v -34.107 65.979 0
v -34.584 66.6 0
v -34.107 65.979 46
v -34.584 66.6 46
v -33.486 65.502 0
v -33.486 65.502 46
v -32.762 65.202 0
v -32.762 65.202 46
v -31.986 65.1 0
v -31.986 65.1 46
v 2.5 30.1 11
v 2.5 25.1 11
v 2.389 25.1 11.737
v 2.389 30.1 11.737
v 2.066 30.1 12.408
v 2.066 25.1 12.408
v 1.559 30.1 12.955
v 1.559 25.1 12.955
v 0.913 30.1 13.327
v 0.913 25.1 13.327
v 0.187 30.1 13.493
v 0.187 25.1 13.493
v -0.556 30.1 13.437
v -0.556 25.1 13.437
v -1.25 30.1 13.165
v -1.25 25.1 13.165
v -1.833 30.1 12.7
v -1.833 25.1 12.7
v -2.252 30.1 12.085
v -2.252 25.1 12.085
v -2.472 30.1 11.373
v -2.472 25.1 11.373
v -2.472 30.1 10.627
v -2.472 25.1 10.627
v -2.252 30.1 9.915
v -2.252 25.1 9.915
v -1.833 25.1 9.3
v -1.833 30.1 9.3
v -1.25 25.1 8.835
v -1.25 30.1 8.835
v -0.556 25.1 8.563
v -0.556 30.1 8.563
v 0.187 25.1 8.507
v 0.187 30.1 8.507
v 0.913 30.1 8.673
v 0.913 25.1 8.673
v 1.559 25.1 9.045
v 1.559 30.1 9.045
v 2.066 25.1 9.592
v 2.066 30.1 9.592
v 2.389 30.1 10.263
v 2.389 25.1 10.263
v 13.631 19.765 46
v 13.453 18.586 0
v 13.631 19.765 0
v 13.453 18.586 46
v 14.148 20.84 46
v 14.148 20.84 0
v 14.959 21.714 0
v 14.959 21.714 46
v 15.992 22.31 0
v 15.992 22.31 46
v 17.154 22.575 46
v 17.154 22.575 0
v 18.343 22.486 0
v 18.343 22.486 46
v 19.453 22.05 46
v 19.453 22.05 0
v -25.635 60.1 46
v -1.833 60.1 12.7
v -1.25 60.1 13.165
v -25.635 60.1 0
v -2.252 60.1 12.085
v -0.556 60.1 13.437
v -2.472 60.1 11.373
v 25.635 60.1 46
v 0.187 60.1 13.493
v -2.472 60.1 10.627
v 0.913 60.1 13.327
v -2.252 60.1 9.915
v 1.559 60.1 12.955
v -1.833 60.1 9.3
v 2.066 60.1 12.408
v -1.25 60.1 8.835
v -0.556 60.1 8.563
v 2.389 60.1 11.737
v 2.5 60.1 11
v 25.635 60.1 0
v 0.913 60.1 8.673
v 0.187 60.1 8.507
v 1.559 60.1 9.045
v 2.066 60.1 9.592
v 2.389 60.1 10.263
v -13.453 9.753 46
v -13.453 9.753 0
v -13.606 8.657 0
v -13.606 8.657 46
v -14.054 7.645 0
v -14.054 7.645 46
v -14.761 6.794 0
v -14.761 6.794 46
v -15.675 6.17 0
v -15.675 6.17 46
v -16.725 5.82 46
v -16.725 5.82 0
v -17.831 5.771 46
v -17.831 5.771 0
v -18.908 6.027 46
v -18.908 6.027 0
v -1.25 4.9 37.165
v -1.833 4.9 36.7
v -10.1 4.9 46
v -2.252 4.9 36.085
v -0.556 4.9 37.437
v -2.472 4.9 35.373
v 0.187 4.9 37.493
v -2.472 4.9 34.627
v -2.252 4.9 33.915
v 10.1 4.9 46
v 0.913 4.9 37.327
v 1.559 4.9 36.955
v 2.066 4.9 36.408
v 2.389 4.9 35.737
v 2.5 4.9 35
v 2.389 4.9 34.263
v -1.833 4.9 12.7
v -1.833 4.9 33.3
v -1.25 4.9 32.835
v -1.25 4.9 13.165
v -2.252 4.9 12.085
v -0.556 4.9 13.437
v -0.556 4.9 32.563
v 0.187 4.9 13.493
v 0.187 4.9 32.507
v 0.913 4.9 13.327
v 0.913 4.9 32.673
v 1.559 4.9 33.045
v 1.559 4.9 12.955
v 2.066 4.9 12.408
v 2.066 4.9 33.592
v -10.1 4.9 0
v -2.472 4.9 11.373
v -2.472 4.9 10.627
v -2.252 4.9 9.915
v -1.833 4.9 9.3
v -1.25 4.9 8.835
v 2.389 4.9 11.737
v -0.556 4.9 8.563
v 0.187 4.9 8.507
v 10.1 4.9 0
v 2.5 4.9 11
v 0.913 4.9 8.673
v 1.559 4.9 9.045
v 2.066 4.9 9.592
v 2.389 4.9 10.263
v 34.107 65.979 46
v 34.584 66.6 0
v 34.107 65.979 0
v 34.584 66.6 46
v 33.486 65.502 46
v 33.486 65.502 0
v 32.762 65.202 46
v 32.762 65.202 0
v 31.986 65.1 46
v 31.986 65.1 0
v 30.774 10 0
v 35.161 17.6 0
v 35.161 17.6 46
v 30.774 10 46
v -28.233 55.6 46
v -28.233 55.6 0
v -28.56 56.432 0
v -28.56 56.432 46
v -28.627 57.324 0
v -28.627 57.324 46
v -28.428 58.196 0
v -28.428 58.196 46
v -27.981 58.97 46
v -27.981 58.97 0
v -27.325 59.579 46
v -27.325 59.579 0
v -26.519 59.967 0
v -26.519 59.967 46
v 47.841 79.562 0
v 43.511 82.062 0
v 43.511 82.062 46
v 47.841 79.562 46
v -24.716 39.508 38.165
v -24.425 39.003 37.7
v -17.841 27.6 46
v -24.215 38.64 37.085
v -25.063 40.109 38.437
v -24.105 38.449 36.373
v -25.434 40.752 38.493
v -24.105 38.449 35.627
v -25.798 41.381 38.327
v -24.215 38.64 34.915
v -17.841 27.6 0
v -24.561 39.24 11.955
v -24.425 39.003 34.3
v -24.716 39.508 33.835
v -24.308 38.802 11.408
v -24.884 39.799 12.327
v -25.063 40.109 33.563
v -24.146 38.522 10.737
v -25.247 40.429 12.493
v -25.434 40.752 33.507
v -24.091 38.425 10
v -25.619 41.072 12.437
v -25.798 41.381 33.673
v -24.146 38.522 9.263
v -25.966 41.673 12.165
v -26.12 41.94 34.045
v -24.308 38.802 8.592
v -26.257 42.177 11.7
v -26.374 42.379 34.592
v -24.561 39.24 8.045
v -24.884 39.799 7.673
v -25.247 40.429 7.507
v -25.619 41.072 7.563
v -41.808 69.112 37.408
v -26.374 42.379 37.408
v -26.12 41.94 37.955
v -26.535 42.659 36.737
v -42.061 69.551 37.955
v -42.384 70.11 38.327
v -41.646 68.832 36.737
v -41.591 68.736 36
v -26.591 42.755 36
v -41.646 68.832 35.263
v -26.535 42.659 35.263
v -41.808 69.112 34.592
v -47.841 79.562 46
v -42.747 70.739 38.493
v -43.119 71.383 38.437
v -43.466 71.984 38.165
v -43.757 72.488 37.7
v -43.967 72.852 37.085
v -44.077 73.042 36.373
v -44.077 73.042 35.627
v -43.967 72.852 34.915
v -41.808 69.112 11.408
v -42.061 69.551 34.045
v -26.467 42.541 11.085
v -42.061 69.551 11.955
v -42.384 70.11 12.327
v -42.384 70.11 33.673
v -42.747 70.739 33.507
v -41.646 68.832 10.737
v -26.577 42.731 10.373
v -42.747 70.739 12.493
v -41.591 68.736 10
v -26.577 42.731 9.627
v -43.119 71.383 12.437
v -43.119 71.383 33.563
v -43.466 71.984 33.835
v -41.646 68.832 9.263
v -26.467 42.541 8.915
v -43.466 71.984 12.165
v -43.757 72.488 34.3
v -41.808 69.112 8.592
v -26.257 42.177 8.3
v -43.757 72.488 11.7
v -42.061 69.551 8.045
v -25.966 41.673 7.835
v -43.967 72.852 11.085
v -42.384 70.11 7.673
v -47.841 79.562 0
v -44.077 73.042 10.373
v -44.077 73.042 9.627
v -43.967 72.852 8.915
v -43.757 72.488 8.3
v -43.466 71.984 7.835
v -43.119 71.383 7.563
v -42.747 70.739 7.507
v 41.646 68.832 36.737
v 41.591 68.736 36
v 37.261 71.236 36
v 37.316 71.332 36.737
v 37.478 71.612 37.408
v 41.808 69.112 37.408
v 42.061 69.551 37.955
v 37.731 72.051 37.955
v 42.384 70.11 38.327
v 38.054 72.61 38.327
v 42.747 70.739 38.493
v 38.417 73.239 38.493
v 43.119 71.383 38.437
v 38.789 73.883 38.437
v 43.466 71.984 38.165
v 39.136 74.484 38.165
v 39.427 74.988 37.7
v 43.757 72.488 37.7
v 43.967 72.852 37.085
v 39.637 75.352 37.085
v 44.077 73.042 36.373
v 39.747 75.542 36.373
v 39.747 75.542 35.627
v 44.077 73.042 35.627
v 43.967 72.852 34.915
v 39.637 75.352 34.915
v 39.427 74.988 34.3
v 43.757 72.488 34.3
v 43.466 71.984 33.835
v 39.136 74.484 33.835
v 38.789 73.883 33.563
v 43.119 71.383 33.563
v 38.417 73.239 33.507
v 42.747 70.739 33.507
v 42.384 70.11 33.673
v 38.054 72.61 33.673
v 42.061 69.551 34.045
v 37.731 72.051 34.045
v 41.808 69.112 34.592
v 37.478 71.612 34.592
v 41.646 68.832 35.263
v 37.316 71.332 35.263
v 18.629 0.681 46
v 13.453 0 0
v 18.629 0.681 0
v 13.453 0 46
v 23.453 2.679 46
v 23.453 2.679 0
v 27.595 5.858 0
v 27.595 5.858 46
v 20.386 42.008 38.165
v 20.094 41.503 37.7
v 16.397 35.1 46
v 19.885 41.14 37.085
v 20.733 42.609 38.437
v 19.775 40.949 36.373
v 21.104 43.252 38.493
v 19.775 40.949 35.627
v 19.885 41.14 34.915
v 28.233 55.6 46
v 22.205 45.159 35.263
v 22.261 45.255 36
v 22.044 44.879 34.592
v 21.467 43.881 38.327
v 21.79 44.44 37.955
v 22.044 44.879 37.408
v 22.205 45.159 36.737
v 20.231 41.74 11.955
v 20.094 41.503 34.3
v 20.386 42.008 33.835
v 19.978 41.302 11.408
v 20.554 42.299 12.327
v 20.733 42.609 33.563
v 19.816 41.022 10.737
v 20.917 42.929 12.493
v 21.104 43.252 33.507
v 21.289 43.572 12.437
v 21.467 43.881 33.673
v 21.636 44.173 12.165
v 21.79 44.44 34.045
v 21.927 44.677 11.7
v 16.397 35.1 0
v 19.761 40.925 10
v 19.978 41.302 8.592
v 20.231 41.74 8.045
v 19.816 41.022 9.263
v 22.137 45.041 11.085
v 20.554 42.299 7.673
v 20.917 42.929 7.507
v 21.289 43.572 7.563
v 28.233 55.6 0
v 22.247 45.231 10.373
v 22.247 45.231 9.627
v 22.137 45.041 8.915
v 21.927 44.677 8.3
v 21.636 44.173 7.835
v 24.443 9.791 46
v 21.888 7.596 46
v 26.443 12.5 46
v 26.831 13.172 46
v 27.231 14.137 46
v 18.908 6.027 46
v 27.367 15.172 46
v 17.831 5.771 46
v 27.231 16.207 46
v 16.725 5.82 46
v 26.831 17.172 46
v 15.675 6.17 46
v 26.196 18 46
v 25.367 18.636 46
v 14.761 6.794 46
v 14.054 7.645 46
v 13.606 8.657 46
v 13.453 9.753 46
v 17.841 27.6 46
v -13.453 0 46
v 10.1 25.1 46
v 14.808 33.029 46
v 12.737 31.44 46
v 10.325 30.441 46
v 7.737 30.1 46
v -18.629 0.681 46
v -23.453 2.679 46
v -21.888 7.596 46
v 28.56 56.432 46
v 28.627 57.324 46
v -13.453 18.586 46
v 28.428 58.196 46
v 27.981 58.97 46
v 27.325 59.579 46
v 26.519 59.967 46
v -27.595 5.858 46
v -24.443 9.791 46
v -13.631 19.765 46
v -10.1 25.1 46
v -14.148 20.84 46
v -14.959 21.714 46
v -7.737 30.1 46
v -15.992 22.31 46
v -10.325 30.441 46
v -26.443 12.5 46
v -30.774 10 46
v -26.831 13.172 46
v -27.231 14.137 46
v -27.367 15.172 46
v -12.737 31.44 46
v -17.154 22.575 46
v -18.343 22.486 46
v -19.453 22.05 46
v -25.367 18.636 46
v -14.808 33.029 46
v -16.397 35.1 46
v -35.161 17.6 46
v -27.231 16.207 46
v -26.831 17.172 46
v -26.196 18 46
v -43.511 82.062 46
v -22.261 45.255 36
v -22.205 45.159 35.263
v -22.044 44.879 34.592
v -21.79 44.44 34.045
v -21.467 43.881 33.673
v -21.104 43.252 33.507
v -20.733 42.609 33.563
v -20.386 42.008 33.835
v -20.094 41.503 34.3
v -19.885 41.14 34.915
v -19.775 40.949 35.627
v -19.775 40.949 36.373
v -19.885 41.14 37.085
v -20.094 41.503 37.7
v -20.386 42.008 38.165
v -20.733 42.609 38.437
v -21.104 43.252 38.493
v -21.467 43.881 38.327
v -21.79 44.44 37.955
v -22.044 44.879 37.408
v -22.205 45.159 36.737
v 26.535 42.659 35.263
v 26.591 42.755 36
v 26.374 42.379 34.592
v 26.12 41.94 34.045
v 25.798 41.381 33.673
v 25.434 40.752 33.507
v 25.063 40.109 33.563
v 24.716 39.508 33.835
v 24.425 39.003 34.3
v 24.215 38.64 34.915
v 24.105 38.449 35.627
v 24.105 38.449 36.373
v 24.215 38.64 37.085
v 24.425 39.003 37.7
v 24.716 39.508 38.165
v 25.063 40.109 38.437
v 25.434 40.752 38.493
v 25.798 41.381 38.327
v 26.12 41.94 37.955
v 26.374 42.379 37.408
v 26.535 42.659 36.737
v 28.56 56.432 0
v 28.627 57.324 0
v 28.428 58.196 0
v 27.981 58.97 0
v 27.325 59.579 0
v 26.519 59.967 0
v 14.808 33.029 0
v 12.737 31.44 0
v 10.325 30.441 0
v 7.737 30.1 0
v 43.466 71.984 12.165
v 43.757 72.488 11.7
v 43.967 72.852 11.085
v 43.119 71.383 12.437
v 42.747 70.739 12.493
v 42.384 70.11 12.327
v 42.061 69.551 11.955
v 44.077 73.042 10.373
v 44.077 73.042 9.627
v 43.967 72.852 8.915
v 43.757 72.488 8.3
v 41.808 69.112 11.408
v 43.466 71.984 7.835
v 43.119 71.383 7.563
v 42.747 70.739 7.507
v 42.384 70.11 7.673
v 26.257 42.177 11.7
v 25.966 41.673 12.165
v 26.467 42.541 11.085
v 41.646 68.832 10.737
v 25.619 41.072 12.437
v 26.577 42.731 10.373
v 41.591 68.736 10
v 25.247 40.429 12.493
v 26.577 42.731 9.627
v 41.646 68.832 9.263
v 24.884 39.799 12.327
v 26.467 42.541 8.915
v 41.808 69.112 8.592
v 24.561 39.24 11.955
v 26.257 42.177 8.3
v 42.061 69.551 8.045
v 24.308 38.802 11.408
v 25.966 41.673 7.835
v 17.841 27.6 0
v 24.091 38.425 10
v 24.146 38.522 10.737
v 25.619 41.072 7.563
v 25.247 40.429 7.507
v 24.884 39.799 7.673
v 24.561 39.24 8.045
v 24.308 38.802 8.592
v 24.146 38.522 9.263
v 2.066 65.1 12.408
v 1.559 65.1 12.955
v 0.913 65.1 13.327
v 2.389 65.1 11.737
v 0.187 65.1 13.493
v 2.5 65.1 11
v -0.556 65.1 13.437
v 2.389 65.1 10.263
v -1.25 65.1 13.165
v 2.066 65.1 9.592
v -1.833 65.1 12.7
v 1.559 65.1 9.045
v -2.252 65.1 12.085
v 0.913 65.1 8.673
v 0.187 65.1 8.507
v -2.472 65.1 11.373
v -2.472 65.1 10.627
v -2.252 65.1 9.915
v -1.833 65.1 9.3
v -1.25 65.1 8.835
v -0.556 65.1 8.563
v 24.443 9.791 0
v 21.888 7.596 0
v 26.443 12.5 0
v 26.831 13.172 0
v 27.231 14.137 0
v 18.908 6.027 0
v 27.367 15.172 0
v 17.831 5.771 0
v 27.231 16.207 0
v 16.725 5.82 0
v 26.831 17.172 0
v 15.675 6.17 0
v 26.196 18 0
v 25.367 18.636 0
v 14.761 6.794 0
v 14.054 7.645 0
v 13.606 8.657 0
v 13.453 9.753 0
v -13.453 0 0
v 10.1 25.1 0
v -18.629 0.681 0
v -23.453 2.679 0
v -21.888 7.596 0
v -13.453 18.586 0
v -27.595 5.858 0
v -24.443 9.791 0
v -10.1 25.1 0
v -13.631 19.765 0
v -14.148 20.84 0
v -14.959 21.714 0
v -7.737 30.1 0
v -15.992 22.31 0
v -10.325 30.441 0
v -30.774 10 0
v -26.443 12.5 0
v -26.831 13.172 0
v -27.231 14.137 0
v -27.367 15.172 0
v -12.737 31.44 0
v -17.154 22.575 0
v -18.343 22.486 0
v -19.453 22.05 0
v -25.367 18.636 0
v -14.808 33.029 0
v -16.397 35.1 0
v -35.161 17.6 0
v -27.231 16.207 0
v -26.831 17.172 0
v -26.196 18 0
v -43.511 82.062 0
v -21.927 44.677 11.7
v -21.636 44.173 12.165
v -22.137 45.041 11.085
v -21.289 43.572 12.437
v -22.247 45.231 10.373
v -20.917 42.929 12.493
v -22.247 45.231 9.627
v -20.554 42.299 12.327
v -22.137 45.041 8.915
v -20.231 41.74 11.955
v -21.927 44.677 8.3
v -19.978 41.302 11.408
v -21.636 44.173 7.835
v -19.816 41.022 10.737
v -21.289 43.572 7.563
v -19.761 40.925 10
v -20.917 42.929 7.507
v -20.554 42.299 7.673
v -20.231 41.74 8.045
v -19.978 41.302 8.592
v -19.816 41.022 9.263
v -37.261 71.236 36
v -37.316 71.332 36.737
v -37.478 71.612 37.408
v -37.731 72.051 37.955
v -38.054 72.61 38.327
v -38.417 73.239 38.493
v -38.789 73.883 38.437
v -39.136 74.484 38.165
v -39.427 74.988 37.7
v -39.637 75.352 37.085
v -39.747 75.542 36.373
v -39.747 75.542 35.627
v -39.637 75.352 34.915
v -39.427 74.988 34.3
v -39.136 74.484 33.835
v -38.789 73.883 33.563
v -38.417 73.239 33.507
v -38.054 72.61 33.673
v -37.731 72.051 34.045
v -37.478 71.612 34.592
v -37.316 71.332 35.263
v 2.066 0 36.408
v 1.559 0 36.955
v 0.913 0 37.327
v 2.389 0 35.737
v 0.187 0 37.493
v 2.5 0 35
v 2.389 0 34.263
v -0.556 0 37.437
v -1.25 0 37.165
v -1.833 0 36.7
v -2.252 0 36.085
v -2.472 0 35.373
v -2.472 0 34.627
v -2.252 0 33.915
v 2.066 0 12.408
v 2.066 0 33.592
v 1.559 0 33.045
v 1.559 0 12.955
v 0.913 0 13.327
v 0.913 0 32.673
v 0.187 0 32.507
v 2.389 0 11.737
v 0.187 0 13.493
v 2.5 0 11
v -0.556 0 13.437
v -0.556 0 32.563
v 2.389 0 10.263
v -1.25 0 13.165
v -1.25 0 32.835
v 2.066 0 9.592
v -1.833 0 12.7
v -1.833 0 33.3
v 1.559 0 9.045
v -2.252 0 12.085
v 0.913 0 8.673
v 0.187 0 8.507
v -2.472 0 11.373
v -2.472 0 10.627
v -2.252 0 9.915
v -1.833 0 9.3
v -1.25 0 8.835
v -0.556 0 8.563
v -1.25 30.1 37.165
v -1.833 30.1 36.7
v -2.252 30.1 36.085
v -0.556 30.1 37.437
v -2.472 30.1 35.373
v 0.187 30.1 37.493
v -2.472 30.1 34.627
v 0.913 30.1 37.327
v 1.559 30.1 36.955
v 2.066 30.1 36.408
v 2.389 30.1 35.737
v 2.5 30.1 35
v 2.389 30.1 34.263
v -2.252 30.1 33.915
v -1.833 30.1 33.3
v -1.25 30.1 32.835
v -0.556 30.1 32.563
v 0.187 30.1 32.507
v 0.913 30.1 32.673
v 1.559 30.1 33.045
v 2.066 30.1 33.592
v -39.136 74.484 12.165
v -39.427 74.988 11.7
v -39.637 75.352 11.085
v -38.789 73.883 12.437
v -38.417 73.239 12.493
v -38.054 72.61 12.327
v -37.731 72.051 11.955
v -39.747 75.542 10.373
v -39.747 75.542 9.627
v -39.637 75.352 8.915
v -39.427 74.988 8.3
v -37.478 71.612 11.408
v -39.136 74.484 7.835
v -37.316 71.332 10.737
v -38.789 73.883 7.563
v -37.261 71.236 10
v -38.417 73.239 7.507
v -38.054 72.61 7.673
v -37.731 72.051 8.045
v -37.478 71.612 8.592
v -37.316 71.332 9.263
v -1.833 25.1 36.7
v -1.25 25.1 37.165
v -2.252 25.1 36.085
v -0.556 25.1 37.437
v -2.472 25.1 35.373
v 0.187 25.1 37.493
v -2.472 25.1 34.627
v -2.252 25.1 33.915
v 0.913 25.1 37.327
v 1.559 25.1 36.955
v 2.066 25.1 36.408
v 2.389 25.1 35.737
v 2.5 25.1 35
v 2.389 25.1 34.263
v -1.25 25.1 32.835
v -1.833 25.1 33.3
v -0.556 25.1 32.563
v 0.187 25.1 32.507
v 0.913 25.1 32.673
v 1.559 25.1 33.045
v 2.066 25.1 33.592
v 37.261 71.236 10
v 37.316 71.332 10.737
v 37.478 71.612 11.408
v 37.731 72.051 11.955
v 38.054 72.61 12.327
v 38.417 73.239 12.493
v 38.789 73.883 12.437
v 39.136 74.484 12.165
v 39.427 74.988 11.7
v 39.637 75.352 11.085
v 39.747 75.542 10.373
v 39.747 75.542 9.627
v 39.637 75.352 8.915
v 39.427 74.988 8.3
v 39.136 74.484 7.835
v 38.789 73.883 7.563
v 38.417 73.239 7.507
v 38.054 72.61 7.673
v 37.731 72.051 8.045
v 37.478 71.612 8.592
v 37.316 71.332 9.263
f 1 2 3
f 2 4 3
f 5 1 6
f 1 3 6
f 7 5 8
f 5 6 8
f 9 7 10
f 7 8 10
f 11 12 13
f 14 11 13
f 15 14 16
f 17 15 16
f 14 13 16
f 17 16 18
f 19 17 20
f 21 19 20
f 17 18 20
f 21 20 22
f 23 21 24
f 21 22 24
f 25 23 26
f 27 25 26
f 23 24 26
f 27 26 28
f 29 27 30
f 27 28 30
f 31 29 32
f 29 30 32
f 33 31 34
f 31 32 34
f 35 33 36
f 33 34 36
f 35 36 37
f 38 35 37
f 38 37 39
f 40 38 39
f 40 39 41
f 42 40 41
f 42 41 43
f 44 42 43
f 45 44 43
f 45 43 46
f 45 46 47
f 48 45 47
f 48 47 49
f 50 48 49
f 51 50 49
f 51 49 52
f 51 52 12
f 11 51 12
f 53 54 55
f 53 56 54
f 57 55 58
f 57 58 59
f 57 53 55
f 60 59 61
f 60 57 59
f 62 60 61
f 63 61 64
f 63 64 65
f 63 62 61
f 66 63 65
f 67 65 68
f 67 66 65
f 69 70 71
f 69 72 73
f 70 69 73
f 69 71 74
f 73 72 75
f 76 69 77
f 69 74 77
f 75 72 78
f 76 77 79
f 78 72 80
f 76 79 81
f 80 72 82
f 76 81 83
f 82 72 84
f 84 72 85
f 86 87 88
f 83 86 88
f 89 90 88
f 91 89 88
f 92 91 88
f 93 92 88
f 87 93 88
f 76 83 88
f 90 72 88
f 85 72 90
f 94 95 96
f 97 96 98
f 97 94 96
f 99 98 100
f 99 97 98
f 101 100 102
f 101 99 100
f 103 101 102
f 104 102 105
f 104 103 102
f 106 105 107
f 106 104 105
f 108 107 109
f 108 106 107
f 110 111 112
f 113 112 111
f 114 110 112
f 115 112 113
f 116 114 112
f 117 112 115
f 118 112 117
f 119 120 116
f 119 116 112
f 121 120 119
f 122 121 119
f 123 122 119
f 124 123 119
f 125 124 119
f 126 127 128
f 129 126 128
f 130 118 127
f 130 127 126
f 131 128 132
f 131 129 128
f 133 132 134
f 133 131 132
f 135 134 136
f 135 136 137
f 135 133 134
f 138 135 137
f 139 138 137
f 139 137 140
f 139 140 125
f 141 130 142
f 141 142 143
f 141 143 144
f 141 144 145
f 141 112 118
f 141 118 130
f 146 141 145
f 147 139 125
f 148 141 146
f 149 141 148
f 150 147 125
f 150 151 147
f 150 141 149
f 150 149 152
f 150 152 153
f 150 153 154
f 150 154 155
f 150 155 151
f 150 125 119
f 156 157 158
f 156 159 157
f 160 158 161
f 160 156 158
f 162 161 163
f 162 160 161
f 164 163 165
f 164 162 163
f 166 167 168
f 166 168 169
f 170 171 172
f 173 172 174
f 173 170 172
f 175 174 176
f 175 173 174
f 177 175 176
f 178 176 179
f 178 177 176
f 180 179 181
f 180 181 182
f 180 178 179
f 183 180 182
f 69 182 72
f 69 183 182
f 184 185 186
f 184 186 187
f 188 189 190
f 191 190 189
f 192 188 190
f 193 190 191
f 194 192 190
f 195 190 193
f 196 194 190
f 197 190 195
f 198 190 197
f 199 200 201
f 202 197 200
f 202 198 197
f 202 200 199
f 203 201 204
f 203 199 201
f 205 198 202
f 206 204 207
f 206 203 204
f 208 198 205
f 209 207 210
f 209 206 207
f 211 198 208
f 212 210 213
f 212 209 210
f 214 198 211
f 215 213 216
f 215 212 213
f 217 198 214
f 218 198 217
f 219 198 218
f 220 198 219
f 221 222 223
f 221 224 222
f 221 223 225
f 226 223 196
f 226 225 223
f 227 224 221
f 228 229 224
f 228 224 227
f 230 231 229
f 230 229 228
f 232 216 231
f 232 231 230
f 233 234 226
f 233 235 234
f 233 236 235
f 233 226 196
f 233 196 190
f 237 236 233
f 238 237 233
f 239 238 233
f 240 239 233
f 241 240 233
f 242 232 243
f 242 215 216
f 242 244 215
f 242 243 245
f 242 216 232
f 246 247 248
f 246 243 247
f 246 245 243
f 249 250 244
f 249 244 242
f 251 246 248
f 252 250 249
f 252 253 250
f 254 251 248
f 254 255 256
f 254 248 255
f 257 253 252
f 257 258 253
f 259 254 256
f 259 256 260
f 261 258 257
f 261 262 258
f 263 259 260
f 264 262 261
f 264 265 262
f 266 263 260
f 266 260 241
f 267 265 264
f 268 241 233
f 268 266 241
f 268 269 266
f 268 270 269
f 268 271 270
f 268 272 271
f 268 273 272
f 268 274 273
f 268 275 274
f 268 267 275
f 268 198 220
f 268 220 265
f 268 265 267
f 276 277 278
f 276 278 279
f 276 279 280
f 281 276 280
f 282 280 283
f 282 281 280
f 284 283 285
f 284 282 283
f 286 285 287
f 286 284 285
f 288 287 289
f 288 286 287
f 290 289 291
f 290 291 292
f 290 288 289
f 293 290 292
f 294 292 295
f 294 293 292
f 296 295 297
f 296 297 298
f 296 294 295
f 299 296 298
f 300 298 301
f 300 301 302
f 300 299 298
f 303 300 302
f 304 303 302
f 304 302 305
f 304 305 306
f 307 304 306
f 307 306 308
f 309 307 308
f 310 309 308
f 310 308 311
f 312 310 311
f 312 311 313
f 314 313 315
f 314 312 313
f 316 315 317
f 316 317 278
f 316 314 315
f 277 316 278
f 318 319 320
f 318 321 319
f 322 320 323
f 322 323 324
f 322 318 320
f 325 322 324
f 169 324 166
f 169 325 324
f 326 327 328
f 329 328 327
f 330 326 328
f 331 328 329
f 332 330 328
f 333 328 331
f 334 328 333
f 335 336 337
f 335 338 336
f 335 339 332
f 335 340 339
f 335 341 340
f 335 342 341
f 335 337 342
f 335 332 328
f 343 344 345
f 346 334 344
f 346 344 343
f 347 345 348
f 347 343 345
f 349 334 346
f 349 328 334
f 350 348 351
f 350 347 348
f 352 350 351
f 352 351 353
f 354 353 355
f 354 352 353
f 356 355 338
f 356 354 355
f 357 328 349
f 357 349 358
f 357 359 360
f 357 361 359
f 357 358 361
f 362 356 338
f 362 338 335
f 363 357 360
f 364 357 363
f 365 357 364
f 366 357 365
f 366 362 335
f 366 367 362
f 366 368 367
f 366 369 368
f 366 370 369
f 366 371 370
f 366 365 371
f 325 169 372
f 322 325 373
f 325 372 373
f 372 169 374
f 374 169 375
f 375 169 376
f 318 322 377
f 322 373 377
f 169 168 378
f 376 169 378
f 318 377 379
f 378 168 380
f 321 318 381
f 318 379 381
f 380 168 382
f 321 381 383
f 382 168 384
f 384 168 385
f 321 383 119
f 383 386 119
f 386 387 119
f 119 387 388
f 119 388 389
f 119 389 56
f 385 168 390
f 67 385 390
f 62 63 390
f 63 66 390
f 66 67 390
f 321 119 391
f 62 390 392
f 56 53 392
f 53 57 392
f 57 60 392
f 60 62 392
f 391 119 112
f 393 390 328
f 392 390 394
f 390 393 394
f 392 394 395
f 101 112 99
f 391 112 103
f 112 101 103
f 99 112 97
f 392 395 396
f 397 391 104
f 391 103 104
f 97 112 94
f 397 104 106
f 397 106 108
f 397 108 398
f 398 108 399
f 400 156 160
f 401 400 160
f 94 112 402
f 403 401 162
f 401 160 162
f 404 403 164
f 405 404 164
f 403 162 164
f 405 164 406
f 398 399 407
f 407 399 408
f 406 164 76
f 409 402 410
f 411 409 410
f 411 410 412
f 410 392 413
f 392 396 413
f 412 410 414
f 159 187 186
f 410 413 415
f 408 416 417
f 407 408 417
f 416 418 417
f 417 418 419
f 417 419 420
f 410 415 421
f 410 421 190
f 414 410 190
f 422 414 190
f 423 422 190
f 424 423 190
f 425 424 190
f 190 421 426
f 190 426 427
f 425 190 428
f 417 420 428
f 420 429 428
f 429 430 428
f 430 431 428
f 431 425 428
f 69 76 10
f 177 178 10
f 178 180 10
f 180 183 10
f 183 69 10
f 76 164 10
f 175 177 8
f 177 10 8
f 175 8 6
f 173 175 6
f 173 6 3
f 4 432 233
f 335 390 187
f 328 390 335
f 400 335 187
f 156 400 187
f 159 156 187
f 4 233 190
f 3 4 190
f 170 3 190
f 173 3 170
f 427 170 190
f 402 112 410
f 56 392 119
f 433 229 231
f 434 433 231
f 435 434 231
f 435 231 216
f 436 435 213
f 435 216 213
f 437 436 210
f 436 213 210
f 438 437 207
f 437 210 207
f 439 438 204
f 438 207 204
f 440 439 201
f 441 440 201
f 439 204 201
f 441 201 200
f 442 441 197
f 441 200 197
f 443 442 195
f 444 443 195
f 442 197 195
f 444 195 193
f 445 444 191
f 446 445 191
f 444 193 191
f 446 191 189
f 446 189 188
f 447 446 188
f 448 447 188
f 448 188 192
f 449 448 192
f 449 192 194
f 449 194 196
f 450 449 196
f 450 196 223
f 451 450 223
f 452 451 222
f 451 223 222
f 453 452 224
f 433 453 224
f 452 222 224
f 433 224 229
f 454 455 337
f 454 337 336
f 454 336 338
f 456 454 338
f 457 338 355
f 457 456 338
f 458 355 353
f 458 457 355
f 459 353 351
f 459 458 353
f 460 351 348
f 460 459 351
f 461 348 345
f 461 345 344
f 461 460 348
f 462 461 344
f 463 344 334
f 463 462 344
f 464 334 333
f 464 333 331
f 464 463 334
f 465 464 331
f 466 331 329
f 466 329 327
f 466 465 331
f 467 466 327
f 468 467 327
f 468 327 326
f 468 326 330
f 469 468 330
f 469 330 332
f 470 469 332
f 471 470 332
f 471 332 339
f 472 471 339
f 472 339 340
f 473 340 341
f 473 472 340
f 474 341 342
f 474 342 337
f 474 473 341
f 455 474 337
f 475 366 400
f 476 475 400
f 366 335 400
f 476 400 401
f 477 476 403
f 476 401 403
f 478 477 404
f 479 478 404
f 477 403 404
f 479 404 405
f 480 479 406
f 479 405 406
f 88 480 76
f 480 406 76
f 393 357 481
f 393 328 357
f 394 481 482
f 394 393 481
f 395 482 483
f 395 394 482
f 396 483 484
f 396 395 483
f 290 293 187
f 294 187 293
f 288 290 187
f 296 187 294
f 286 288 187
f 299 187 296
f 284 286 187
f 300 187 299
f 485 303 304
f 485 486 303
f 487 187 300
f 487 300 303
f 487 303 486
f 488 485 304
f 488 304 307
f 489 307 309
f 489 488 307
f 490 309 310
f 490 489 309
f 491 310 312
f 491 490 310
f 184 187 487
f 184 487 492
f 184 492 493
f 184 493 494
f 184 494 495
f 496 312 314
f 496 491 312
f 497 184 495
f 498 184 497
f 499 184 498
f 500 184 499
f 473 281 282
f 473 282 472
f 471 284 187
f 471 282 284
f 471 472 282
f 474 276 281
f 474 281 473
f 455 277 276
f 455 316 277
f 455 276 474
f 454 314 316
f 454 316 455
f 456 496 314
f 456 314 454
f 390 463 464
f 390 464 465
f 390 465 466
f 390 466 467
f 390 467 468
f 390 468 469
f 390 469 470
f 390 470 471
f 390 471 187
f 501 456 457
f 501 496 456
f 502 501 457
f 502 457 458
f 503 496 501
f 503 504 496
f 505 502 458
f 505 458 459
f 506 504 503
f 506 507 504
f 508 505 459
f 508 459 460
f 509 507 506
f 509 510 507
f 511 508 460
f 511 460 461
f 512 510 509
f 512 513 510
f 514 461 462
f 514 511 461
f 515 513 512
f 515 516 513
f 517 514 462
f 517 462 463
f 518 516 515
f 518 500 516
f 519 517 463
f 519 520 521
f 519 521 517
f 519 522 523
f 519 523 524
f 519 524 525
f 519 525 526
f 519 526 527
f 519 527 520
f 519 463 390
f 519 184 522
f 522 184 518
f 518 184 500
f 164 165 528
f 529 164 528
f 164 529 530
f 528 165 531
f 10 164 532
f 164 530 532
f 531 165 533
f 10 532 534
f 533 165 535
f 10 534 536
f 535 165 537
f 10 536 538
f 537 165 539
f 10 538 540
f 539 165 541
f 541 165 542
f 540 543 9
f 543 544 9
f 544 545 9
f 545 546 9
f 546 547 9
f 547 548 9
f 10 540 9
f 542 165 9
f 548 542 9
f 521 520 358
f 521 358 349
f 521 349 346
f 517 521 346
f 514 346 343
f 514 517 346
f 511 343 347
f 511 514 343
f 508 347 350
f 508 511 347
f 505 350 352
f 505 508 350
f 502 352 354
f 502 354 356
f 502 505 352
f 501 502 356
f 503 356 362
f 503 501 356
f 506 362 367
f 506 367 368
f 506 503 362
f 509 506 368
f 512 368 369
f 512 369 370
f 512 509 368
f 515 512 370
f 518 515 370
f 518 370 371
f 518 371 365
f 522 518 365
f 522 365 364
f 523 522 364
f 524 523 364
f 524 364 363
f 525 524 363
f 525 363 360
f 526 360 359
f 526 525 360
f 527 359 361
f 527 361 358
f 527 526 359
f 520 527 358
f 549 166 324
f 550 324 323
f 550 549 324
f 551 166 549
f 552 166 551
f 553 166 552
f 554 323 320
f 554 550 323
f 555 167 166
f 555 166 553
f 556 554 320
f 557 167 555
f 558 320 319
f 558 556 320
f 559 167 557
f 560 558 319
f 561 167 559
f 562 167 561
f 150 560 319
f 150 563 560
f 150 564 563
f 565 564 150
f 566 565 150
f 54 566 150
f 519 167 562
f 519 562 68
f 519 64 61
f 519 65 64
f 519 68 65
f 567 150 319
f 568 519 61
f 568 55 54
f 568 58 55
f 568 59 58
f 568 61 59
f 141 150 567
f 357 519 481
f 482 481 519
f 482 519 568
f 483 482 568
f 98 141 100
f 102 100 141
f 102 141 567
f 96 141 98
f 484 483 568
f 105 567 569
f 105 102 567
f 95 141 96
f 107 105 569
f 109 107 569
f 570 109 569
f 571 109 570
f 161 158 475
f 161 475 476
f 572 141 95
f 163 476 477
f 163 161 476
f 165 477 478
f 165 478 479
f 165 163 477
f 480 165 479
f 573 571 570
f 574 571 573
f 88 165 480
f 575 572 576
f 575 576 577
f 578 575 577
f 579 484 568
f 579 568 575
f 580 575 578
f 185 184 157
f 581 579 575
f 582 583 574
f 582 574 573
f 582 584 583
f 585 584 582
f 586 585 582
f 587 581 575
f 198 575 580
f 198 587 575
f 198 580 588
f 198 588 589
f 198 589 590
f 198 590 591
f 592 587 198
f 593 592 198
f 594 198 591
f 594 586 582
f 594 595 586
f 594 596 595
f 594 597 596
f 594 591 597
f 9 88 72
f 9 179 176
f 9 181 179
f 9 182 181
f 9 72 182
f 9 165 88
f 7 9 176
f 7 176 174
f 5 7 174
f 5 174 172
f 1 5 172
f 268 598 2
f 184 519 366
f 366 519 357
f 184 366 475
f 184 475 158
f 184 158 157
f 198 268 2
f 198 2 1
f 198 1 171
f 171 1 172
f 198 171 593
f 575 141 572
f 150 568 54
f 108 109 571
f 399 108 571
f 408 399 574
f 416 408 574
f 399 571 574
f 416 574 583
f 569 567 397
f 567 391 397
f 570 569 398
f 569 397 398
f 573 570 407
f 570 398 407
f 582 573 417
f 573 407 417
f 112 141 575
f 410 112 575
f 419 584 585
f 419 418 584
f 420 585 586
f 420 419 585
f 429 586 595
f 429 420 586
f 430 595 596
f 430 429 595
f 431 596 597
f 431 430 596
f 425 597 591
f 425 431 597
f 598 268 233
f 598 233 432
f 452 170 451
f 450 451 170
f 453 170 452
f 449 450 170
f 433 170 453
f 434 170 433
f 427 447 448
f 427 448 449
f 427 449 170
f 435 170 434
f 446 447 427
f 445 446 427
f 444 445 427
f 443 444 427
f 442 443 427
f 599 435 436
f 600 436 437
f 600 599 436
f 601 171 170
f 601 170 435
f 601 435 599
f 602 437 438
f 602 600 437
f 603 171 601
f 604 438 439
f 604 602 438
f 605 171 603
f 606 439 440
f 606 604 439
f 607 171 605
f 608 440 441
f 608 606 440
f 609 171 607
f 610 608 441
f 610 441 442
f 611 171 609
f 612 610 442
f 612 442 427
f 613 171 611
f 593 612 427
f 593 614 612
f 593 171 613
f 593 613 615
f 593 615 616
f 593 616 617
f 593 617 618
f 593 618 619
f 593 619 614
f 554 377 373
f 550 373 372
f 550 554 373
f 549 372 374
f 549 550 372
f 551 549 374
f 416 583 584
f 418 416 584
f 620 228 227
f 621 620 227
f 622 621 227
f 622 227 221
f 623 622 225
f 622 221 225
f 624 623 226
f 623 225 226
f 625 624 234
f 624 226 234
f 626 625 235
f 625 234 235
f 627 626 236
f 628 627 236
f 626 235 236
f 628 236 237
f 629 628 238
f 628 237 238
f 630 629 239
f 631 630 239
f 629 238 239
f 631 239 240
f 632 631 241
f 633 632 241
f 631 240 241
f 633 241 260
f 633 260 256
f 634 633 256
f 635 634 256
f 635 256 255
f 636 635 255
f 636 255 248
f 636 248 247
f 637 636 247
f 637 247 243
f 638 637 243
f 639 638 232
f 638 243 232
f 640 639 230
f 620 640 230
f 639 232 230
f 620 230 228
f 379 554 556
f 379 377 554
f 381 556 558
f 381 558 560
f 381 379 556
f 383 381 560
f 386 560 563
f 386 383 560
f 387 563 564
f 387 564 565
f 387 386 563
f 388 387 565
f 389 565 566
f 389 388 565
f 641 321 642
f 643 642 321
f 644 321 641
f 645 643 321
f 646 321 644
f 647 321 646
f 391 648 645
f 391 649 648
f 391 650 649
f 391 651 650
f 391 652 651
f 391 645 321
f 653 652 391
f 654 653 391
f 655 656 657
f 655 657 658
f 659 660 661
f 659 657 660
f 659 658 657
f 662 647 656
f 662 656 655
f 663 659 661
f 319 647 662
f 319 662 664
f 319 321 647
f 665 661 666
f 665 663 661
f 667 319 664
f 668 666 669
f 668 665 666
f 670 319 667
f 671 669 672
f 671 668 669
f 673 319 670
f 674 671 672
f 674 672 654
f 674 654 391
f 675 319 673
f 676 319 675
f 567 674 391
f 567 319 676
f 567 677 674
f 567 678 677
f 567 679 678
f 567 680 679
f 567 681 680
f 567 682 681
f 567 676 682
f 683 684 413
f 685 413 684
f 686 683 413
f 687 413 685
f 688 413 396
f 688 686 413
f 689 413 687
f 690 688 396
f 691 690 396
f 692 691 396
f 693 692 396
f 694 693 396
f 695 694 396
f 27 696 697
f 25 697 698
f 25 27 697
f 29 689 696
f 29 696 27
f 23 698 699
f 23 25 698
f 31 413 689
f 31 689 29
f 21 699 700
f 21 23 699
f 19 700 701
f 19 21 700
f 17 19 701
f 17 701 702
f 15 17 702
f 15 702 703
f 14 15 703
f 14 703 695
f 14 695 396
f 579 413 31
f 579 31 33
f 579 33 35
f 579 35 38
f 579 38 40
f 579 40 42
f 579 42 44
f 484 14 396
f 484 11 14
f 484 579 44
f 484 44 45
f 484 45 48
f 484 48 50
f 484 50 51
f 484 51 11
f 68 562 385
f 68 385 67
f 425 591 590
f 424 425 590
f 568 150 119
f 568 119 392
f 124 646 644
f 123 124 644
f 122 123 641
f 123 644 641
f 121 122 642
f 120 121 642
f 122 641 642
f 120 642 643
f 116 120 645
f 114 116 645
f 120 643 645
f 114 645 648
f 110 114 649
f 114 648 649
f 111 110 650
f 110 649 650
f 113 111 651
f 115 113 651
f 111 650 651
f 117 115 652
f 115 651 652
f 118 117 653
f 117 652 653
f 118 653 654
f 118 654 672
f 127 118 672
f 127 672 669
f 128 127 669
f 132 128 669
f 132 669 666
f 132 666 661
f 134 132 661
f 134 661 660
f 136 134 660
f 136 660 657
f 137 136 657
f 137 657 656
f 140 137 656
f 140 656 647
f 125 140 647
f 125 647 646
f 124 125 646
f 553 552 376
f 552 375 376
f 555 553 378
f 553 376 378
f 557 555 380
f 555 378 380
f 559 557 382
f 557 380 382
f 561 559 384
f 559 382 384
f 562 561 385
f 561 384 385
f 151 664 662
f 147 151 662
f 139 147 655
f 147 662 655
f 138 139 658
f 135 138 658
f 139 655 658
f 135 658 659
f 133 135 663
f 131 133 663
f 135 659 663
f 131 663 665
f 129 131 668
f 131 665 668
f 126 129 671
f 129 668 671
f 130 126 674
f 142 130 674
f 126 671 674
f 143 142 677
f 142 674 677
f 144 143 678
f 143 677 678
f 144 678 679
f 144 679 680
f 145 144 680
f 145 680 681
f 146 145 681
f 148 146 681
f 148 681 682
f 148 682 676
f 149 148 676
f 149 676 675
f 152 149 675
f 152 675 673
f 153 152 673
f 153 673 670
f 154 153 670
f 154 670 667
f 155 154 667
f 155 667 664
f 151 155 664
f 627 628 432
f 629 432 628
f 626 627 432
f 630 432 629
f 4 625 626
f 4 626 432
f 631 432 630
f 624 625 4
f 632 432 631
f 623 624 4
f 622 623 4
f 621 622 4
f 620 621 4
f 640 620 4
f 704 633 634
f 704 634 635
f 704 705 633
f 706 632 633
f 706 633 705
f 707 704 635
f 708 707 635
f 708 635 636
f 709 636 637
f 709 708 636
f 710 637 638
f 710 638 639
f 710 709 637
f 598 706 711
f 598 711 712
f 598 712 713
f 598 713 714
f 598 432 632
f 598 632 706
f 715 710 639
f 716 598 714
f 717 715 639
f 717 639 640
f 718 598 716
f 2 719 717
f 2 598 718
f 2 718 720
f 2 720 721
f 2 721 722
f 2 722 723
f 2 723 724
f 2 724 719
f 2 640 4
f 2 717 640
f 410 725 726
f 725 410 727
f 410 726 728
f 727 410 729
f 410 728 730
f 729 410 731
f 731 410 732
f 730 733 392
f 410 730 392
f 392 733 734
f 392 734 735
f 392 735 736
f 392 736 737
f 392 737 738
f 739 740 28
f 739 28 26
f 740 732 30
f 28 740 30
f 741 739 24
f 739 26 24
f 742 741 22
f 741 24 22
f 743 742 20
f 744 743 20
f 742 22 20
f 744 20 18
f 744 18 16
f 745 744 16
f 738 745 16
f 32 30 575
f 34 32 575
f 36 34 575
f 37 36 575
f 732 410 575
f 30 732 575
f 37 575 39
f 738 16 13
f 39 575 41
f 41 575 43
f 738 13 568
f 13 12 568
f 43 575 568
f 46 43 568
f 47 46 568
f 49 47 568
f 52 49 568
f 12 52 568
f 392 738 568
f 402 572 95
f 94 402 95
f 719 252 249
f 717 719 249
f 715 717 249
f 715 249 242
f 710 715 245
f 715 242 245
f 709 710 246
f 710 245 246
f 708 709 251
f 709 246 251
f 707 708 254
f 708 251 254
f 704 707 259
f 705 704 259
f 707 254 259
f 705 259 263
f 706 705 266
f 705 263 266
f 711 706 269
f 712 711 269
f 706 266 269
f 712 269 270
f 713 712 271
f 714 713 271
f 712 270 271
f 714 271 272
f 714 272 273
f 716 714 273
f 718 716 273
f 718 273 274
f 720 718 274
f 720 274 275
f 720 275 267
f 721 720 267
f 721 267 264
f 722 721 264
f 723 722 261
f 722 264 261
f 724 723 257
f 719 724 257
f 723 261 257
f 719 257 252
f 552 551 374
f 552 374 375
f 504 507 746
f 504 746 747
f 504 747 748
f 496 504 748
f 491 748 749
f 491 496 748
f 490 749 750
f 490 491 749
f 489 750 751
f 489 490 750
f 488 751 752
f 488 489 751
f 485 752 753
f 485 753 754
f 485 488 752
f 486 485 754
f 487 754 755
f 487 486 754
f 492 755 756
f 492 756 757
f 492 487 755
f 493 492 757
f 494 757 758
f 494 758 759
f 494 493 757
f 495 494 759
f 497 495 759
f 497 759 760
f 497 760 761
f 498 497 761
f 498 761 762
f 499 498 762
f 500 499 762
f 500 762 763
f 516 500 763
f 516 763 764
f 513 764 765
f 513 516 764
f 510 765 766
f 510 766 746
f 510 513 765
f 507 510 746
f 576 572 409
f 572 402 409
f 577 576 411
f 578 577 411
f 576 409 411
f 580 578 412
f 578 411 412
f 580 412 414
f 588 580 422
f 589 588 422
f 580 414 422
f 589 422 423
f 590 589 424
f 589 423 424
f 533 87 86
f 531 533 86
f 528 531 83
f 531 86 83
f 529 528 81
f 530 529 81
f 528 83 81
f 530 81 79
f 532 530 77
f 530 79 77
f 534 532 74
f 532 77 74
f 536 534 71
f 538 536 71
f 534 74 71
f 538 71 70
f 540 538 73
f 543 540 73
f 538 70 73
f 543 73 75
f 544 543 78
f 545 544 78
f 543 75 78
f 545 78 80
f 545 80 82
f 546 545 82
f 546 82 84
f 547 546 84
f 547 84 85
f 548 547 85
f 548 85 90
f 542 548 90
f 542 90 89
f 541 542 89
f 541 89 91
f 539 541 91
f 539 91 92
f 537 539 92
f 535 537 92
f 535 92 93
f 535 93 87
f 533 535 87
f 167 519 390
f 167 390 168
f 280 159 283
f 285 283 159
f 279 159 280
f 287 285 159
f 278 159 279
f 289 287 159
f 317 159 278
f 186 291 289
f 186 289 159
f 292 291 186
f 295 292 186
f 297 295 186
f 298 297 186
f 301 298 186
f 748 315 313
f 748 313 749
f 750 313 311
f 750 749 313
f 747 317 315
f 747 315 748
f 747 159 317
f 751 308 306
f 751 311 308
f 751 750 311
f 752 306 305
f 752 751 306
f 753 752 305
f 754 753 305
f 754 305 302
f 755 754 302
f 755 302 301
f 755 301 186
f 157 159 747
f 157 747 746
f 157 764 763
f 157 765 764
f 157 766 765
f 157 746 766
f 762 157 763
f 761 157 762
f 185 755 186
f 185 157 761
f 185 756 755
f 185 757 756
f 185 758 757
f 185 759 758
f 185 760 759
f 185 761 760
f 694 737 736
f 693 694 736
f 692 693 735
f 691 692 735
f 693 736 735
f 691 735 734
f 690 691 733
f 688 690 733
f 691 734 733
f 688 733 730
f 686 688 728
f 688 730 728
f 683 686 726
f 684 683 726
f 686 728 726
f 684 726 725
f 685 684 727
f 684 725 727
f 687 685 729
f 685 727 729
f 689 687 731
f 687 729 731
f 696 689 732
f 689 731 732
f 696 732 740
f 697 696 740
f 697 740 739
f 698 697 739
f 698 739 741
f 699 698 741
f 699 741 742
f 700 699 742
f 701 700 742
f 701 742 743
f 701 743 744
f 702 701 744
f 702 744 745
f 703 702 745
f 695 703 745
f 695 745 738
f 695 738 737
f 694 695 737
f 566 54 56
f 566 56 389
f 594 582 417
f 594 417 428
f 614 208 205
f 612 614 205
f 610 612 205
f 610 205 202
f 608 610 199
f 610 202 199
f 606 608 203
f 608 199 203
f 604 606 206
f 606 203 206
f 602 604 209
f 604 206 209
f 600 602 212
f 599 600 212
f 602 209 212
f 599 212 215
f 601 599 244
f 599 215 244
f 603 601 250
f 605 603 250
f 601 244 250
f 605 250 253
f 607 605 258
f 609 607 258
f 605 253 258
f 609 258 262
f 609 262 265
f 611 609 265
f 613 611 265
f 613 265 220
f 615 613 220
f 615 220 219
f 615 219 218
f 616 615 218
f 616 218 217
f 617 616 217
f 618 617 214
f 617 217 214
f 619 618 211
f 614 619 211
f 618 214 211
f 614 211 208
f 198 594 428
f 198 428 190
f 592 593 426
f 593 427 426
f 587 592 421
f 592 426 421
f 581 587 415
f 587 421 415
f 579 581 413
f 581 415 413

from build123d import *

# Parameters (mm, degrees)
SCHIZZO1_W                   = 20.2
SCHIZZO1_H                   = 20.2
ESTRUSIONE_ESTRUSIONE1_DEPTH = 46
RACCORDO1_R                  = 20
SCHIZZO8_R                   = 2.5
TAGLIO_ESTRUSIONE3_DEPTH     = 5
TAGLIO_ESTRUSIONE4_DEPTH     = 106.540709324
RACCORDO2_R                  = 10
RACCORDO3_R                  = 4
SCHIZZO11_R                  = 2.5
TAGLIO_ESTRUSIONE5_DEPTH     = 106.540709324
ESTRUSIONE_ESTRUSIONE2_DEPTH = 46
RACCORDO4_R                  = 3
SCHIZZO11_3_R                = 2.5
TAGLIO_ESTRUSIONE6_DEPTH     = 106.540709324


with BuildPart() as part:
    # Schizzo1 → Estrusione-Estrusione1 (new body)
    with BuildSketch(Plane.XY):
        Polygon((25, 0), (-25, 0), (-35.161364738, 17.6), (-17.840856662, 27.6), (-47.840856662, 79.561524227), (-43.510729643, 82.061524227), (-13.510729643, 30.1), (13.510729643, 30.1), (43.510729643, 82.061524227), (47.840856662, 79.561524227), (17.840856662, 27.6), (35.161364738, 17.6), align=None)
        with Locations((0, 15)):
            Rectangle(SCHIZZO1_W, SCHIZZO1_H, mode=Mode.SUBTRACT)
    extrude(amount=ESTRUSIONE_ESTRUSIONE1_DEPTH)

    # Raccordo1
    raccordo1_edges = [part.edges().sort_by_distance(p)[0] for p in [
        (25, 0, 23),
        (-25, 0, 23),
    ]]
    fillet(raccordo1_edges, radius=RACCORDO1_R)

    # Schizzo8 → Taglio-Estrusione3 (cut)
    with BuildSketch(Plane(origin=(-1.429491924, -0.825317547, 0), x_dir=(0, 0, 1), z_dir=(-0.8660254037844398, -0.49999999999999806, 0))):
        with Locations(Location((10, 82.822729475, 0), (0, 0, 270))):
            Circle(SCHIZZO8_R)
        with Locations(Location((10, 47.822729475, 0), (0, 0, 270))):
            Circle(SCHIZZO8_R)
        with Locations(Location((36, 47.822729475, 0), (0, 0, 90))):
            Circle(SCHIZZO8_R)
        with Locations(Location((36, 82.822729475, 0), (0, 0, 270))):
            Circle(SCHIZZO8_R)
    taglio_estrusione3 = extrude(amount=-TAGLIO_ESTRUSIONE3_DEPTH, mode=Mode.SUBTRACT)

    # Specchia1: Taglio-Estrusione3 across plane
    add(taglio_estrusione3.mirror(Plane(origin=(0, 0, 0), x_dir=(0, 0, 1), z_dir=(1, 0, 0))), mode=Mode.SUBTRACT)

    # Schizzo10 → Taglio-Estrusione4 (cut, through all)
    with BuildSketch(Plane(origin=(0, 0, 0), x_dir=(-1, 0, 0), z_dir=(0, 0, -1))):
        with BuildLine():
            Line((-28.831237719, 16.635898385), (-13.452994616, 25.51453118))
            Line((-13.452994616, 25.51453118), (-13.452994616, 5))
            ThreePointArc((-13.452994616, 5), (-20.952994616, 7.009618943), (-26.443375673, 12.5))
            Line((-26.443375673, 12.5), (-28.831237719, 16.635898385))
        make_face()
        with BuildLine():
            Line((13.452994616, 25.51453118), (13.452994616, 5))
            ThreePointArc((13.452994616, 5), (20.952994616, 7.009618943), (26.443375673, 12.5))
            Line((26.443375673, 12.5), (28.831237719, 16.635898385))
            Line((28.831237719, 16.635898385), (13.452994616, 25.51453118))
        make_face()
    extrude(amount=-TAGLIO_ESTRUSIONE4_DEPTH, mode=Mode.SUBTRACT)

    # Raccordo2
    raccordo2_edges = [part.edges().sort_by_distance(p)[0] for p in [
        (-13.510729643, 30.1, 23),
        (13.510729643, 30.1, 23),
    ]]
    fillet(raccordo2_edges, radius=RACCORDO2_R)

    # Raccordo3
    raccordo3_edges = [part.edges().sort_by_distance(p)[0] for p in [
        (28.831237719, 16.635898385, 23),
        (13.452994616, 25.51453118, 23),
        (13.452994616, 5, 23),
        (-13.452994616, 5, 23),
        (-13.452994616, 25.51453118, 23),
        (-28.831237719, 16.635898385, 23),
    ]]
    fillet(raccordo3_edges, radius=RACCORDO3_R)

    # Schizzo11 → Taglio-Estrusione5 (cut, through all)
    with BuildSketch(Plane.XZ):
        with Locations((0, 35)):
            Circle(SCHIZZO11_R)
        with Locations((0, 11)):
            Circle(SCHIZZO11_R)
    extrude(amount=-TAGLIO_ESTRUSIONE5_DEPTH, mode=Mode.SUBTRACT)

    # Schizzo13 → Estrusione-Estrusione2 (add)
    with BuildSketch(Plane(origin=(0, 0, 0), x_dir=(-1, 0, 0), z_dir=(0, 0, -1))):
        Polygon((-33.717989065, 65.1), (33.717989065, 65.1), (30.831237719, 60.1), (-30.831237719, 60.1), align=None)
    extrude(amount=-ESTRUSIONE_ESTRUSIONE2_DEPTH)

    # Raccordo4
    raccordo4_edges = [part.edges().sort_by_distance(p)[0] for p in [
        (30.831237719, 60.1, 23),
        (33.717989065, 65.1, 23),
        (-33.717989065, 65.1, 23),
        (-30.831237719, 60.1, 23),
    ]]
    fillet(raccordo4_edges, radius=RACCORDO4_R)

    # Schizzo11<3> → Taglio-Estrusione6 (cut, through all)
    with BuildSketch(Plane.XZ):
        with Locations((0, 11)):
            Circle(SCHIZZO11_3_R)
    extrude(amount=-TAGLIO_ESTRUSIONE6_DEPTH, mode=Mode.SUBTRACT)


solid = part.part
